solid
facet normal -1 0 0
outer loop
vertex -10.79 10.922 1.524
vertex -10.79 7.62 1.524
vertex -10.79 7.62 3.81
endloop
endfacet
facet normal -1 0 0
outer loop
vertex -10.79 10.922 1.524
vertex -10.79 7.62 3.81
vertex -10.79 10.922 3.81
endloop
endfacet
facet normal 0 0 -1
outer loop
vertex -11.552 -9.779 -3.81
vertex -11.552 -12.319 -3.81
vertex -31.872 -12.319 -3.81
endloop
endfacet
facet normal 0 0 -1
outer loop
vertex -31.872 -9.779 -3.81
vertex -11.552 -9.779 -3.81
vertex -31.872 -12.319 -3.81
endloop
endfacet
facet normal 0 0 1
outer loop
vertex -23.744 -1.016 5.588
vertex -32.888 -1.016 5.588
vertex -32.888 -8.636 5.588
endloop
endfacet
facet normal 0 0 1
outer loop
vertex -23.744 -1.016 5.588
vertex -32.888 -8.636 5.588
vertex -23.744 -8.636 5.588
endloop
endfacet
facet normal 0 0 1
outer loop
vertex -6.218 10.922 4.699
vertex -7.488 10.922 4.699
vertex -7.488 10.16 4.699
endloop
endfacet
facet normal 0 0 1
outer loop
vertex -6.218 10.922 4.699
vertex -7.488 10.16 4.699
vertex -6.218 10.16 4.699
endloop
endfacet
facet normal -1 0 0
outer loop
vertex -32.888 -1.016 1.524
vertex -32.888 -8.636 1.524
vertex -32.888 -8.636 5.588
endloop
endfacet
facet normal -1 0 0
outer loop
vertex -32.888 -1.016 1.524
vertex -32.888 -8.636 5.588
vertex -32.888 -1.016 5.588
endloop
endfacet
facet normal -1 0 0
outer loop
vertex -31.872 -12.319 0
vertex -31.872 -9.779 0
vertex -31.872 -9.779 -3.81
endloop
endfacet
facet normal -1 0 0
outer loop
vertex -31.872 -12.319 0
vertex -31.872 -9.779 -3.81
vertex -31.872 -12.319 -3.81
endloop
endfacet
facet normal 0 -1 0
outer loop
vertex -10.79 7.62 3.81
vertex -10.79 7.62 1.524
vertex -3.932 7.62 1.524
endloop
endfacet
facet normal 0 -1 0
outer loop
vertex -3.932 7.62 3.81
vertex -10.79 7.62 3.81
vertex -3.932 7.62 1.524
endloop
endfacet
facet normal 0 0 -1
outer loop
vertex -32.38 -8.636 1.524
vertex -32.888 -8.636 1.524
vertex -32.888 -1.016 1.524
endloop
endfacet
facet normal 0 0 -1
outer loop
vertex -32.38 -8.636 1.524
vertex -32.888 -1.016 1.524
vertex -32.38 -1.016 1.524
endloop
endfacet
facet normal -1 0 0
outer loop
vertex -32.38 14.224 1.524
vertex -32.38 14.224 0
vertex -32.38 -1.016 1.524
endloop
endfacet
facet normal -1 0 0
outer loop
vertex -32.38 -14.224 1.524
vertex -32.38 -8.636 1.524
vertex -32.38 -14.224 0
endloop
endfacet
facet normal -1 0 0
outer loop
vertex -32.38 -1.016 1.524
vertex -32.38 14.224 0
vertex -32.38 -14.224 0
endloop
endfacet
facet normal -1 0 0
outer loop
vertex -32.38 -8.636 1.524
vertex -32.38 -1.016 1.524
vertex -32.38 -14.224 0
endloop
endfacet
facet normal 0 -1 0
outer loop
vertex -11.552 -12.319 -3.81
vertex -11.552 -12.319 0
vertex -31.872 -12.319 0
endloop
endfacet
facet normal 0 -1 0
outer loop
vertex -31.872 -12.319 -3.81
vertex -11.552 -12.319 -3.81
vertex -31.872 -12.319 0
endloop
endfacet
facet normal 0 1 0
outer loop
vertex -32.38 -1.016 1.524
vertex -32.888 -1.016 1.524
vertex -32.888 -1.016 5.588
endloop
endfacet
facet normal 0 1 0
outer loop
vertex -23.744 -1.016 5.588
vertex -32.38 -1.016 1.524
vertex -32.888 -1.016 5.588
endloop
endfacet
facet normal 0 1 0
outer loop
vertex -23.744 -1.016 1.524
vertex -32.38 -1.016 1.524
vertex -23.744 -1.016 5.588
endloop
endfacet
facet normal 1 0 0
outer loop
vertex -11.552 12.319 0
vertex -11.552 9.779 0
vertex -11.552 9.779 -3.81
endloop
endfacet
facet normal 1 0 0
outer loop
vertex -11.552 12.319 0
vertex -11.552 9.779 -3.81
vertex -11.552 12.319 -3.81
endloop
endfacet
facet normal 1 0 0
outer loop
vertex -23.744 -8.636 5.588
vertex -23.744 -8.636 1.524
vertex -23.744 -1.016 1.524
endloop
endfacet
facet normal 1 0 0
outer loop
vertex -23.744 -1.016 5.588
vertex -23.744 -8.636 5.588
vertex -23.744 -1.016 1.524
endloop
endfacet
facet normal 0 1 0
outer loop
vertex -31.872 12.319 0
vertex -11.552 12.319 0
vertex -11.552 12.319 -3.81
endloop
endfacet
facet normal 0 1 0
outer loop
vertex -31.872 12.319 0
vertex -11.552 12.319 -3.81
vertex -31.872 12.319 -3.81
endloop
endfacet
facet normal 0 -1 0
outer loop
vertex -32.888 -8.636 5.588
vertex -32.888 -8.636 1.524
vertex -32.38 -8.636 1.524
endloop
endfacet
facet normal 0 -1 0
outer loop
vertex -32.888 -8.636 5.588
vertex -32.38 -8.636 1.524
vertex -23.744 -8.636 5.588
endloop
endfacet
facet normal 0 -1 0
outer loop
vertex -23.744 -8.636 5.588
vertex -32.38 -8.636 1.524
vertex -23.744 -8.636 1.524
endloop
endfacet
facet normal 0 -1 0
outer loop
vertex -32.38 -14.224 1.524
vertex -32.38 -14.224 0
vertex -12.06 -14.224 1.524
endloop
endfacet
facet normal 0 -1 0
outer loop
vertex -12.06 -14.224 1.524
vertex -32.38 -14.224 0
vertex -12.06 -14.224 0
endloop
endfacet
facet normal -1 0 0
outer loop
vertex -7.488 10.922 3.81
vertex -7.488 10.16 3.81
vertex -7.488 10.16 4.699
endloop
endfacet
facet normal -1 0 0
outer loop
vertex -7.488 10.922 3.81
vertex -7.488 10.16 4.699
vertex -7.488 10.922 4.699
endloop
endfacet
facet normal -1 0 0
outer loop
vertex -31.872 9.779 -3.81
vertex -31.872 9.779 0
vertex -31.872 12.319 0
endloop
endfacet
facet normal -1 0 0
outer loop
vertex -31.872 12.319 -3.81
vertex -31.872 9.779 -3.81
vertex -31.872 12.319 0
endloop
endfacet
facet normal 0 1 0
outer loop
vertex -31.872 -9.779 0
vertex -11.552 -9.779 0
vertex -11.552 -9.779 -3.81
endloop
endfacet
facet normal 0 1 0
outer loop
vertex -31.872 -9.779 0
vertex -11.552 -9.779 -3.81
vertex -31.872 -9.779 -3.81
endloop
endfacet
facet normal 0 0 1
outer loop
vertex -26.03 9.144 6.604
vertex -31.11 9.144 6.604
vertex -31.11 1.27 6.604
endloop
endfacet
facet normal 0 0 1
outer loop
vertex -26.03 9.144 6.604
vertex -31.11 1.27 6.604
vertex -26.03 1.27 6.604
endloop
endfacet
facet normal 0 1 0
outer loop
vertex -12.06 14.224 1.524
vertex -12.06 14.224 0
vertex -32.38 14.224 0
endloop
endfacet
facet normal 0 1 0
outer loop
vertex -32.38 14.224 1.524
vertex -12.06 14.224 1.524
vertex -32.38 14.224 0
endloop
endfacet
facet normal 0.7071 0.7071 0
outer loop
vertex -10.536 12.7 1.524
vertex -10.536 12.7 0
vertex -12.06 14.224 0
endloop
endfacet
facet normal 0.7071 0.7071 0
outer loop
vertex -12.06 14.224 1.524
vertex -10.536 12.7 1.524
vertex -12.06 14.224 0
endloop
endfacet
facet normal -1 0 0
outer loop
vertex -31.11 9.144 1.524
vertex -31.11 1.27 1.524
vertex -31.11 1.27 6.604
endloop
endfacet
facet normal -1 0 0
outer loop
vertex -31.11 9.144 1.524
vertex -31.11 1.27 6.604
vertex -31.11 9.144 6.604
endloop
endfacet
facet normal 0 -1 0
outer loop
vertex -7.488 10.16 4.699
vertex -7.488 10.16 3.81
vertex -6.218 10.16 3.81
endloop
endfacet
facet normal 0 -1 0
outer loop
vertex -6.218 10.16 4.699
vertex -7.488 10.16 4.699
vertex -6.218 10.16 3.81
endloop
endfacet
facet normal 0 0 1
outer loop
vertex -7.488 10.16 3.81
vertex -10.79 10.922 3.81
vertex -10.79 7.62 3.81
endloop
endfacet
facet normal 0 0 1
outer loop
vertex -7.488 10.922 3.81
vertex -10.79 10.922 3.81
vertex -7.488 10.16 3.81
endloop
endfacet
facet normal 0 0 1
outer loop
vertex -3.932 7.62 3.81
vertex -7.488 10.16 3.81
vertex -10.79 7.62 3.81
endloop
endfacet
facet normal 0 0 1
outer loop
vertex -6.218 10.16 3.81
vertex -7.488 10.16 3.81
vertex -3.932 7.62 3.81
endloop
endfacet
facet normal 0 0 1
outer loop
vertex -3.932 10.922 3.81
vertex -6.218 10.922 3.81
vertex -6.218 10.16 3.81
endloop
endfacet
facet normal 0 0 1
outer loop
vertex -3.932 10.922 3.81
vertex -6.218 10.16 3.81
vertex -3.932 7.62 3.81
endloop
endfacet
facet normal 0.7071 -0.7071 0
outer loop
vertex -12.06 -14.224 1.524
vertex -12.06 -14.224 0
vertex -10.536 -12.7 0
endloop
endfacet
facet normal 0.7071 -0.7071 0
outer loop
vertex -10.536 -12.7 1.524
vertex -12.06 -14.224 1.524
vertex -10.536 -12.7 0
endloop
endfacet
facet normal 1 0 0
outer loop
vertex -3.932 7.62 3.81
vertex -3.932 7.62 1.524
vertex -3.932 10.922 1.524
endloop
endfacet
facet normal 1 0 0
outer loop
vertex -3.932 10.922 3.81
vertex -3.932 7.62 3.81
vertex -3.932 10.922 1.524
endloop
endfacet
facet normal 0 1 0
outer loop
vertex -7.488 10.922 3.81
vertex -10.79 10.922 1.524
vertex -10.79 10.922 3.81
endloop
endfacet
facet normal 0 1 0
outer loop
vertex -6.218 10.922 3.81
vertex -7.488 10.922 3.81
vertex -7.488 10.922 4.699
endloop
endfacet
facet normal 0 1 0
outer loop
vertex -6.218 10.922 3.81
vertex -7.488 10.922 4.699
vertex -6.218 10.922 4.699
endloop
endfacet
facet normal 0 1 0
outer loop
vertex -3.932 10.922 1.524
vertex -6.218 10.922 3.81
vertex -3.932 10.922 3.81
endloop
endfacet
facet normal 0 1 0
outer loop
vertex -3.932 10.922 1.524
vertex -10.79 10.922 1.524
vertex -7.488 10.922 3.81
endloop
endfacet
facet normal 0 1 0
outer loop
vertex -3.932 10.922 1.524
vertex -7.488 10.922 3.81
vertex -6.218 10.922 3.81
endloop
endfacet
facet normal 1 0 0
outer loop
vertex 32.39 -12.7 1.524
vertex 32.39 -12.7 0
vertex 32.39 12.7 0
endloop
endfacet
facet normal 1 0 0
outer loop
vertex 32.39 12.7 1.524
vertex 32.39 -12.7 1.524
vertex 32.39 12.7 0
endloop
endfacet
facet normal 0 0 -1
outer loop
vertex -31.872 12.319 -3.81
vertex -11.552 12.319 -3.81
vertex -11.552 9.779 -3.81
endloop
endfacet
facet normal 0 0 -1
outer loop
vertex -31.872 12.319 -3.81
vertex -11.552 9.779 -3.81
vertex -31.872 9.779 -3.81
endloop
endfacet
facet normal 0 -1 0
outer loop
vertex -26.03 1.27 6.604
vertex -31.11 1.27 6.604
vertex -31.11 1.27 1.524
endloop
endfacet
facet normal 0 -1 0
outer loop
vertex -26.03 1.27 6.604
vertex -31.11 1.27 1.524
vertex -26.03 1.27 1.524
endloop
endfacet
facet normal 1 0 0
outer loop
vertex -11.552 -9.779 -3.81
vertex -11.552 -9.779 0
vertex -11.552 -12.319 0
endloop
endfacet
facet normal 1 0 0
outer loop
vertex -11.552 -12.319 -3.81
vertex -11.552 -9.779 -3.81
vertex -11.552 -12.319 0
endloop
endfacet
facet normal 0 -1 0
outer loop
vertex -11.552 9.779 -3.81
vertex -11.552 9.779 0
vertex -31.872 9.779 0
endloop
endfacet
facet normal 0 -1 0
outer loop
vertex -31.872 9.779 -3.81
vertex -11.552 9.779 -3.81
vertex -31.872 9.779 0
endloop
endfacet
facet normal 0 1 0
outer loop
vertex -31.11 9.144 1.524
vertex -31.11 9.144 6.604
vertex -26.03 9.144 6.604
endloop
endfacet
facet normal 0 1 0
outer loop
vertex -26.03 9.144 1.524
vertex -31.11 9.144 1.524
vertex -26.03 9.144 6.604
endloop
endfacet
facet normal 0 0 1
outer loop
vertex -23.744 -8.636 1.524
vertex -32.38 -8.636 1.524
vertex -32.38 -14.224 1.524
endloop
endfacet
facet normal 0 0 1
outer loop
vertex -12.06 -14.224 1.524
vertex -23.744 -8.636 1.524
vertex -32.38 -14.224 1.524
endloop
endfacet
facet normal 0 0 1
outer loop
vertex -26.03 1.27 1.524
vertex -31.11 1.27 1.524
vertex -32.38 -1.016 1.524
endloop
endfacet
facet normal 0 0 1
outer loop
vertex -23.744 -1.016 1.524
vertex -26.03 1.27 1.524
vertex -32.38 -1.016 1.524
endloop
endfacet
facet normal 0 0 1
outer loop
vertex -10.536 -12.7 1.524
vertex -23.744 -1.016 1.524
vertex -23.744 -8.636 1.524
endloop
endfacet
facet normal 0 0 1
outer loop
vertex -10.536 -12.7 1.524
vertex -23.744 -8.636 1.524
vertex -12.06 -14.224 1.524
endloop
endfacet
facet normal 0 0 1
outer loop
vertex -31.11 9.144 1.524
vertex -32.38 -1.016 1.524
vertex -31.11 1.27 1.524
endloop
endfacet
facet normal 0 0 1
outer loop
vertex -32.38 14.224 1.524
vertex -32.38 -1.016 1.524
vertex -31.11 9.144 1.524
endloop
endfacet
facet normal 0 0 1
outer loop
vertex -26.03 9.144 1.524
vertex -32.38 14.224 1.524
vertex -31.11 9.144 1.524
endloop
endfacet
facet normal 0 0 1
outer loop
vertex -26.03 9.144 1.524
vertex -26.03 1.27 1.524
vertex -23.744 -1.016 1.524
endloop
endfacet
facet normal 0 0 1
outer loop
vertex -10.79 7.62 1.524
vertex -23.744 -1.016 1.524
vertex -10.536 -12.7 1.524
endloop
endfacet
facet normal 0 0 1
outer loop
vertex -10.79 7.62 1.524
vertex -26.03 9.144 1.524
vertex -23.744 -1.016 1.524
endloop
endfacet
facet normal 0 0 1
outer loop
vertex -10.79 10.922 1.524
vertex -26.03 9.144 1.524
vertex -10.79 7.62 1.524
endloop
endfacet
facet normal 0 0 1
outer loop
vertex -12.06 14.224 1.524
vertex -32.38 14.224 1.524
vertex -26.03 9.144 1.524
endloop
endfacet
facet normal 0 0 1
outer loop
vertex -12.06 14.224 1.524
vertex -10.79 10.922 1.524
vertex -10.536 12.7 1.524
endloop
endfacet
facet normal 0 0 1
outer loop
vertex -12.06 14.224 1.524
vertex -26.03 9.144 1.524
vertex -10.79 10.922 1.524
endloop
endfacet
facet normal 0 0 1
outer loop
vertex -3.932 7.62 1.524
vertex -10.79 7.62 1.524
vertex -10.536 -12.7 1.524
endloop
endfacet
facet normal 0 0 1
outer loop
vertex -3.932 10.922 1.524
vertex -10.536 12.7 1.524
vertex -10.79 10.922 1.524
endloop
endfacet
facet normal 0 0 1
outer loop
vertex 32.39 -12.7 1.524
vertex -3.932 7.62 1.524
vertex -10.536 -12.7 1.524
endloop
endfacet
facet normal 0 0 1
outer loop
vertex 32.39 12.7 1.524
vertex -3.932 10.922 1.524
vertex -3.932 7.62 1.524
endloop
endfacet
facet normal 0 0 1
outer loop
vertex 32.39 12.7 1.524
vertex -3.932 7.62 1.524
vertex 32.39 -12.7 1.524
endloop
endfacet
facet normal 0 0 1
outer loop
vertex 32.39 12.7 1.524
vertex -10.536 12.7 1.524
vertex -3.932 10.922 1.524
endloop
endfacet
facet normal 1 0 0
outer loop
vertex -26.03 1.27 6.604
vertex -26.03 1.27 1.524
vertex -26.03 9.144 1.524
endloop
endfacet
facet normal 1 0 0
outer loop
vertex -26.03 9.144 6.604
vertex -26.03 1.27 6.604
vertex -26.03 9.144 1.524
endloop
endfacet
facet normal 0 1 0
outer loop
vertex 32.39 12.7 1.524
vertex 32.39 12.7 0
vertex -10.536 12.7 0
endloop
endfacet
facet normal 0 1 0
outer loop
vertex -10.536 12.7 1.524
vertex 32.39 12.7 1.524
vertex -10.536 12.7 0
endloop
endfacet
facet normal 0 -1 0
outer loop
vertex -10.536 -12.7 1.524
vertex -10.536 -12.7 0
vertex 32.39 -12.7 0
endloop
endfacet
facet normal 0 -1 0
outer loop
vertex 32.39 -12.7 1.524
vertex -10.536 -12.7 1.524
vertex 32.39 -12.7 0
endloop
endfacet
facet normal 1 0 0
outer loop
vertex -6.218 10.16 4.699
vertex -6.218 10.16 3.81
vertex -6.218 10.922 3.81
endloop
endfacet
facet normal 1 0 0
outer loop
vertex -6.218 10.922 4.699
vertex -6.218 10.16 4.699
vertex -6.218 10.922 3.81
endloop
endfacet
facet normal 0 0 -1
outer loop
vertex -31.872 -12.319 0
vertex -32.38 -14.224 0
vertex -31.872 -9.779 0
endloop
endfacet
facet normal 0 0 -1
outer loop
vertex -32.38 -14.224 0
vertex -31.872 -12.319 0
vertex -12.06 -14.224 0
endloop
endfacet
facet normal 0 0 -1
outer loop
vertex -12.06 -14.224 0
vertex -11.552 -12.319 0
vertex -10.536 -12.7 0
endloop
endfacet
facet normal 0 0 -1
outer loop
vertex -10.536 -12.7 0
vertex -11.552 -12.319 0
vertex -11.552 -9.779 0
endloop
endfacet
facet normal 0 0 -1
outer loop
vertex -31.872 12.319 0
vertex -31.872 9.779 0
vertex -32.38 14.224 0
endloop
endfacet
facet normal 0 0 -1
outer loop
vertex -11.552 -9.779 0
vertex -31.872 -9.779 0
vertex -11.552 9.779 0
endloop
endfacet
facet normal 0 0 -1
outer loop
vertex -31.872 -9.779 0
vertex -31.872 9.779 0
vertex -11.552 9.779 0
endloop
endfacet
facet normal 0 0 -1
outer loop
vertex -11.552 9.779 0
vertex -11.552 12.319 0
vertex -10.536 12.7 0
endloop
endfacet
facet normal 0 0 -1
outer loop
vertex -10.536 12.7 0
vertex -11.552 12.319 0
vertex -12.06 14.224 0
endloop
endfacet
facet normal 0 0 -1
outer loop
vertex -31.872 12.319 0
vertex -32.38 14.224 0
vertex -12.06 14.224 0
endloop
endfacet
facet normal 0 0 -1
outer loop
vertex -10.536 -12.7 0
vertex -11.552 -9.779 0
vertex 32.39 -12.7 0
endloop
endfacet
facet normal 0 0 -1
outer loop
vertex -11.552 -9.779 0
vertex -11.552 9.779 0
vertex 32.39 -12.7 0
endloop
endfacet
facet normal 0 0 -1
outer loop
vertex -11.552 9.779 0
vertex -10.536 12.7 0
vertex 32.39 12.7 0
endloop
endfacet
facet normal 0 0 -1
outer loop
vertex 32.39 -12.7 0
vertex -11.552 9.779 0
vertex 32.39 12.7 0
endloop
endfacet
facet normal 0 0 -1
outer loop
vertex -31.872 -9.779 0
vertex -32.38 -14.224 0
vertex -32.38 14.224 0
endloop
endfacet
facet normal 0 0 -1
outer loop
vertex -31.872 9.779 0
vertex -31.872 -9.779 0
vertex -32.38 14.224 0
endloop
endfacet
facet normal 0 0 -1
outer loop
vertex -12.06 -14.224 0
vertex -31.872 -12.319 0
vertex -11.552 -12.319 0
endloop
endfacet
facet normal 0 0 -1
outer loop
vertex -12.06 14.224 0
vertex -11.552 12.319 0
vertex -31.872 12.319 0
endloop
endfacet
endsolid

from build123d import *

# Parameters (mm, degrees)
BOSS_EXTRUDE1_DEPTH = 1.524
SKETCH2_W           = 9.144
SKETCH2_H           = 7.62
BOSS_EXTRUDE2_DEPTH = 4.064
SKETCH3_W           = 5.08
SKETCH3_H           = 7.874
BOSS_EXTRUDE3_DEPTH = 5.08
SKETCH4_W           = 20.32
SKETCH4_H           = 2.54
BOSS_EXTRUDE4_DEPTH = 3.81
SKETCH6_W           = 6.858
SKETCH6_H           = 3.302
BOSS_EXTRUDE5_DEPTH = 2.286
SKETCH7_W           = 1.27
SKETCH7_H           = 0.762
BOSS_EXTRUDE6_DEPTH = 0.889


with BuildPart() as part:
    # Sketch1 → Boss-Extrude1 (new body)
    with BuildSketch(Plane.XY):
        Polygon((-10.536438109, -12.7), (32.389561792, -12.7), (32.389561792, 12.7), (-10.536438109, 12.7), (-12.060438109, 14.224), (-32.380438109, 14.224), (-32.380438109, -14.224), (-12.060438109, -14.224), align=None)
    extrude(amount=BOSS_EXTRUDE1_DEPTH)

    # Sketch2 → Boss-Extrude2 (add)
    with BuildSketch(Plane.XY.offset(1.524)):
        with Locations((-28.316438109, -4.826)):
            Rectangle(SKETCH2_W, SKETCH2_H)
    extrude(amount=BOSS_EXTRUDE2_DEPTH)

    # Sketch3 → Boss-Extrude3 (add)
    with BuildSketch(Plane.XY.offset(1.524)):
        with Locations((-28.570438109, 5.207)):
            Rectangle(SKETCH3_W, SKETCH3_H)
    extrude(amount=BOSS_EXTRUDE3_DEPTH)

    # Sketch4 → Boss-Extrude4 (add)
    with BuildSketch(Plane(origin=(0, 0, 0), x_dir=(-1, 0, 0), z_dir=(0, 0, -1))):
        with Locations((21.712438109, 11.049)):
            Rectangle(SKETCH4_W, SKETCH4_H)
    boss_extrude4 = extrude(amount=BOSS_EXTRUDE4_DEPTH)

    # Mirror1: Boss-Extrude4 across plane
    add(boss_extrude4.mirror(Plane.ZX))

    # Sketch6 → Boss-Extrude5 (add)
    with BuildSketch(Plane.XY.offset(1.524)):
        with Locations((-7.361438109, 9.271)):
            Rectangle(SKETCH6_W, SKETCH6_H)
    extrude(amount=BOSS_EXTRUDE5_DEPTH)

    # Sketch7 → Boss-Extrude6 (add)
    with BuildSketch(Plane.XY.offset(3.81)):
        with Locations((-6.853438109, 10.541)):
            Rectangle(SKETCH7_W, SKETCH7_H)
    extrude(amount=BOSS_EXTRUDE6_DEPTH)


solid = part.part
